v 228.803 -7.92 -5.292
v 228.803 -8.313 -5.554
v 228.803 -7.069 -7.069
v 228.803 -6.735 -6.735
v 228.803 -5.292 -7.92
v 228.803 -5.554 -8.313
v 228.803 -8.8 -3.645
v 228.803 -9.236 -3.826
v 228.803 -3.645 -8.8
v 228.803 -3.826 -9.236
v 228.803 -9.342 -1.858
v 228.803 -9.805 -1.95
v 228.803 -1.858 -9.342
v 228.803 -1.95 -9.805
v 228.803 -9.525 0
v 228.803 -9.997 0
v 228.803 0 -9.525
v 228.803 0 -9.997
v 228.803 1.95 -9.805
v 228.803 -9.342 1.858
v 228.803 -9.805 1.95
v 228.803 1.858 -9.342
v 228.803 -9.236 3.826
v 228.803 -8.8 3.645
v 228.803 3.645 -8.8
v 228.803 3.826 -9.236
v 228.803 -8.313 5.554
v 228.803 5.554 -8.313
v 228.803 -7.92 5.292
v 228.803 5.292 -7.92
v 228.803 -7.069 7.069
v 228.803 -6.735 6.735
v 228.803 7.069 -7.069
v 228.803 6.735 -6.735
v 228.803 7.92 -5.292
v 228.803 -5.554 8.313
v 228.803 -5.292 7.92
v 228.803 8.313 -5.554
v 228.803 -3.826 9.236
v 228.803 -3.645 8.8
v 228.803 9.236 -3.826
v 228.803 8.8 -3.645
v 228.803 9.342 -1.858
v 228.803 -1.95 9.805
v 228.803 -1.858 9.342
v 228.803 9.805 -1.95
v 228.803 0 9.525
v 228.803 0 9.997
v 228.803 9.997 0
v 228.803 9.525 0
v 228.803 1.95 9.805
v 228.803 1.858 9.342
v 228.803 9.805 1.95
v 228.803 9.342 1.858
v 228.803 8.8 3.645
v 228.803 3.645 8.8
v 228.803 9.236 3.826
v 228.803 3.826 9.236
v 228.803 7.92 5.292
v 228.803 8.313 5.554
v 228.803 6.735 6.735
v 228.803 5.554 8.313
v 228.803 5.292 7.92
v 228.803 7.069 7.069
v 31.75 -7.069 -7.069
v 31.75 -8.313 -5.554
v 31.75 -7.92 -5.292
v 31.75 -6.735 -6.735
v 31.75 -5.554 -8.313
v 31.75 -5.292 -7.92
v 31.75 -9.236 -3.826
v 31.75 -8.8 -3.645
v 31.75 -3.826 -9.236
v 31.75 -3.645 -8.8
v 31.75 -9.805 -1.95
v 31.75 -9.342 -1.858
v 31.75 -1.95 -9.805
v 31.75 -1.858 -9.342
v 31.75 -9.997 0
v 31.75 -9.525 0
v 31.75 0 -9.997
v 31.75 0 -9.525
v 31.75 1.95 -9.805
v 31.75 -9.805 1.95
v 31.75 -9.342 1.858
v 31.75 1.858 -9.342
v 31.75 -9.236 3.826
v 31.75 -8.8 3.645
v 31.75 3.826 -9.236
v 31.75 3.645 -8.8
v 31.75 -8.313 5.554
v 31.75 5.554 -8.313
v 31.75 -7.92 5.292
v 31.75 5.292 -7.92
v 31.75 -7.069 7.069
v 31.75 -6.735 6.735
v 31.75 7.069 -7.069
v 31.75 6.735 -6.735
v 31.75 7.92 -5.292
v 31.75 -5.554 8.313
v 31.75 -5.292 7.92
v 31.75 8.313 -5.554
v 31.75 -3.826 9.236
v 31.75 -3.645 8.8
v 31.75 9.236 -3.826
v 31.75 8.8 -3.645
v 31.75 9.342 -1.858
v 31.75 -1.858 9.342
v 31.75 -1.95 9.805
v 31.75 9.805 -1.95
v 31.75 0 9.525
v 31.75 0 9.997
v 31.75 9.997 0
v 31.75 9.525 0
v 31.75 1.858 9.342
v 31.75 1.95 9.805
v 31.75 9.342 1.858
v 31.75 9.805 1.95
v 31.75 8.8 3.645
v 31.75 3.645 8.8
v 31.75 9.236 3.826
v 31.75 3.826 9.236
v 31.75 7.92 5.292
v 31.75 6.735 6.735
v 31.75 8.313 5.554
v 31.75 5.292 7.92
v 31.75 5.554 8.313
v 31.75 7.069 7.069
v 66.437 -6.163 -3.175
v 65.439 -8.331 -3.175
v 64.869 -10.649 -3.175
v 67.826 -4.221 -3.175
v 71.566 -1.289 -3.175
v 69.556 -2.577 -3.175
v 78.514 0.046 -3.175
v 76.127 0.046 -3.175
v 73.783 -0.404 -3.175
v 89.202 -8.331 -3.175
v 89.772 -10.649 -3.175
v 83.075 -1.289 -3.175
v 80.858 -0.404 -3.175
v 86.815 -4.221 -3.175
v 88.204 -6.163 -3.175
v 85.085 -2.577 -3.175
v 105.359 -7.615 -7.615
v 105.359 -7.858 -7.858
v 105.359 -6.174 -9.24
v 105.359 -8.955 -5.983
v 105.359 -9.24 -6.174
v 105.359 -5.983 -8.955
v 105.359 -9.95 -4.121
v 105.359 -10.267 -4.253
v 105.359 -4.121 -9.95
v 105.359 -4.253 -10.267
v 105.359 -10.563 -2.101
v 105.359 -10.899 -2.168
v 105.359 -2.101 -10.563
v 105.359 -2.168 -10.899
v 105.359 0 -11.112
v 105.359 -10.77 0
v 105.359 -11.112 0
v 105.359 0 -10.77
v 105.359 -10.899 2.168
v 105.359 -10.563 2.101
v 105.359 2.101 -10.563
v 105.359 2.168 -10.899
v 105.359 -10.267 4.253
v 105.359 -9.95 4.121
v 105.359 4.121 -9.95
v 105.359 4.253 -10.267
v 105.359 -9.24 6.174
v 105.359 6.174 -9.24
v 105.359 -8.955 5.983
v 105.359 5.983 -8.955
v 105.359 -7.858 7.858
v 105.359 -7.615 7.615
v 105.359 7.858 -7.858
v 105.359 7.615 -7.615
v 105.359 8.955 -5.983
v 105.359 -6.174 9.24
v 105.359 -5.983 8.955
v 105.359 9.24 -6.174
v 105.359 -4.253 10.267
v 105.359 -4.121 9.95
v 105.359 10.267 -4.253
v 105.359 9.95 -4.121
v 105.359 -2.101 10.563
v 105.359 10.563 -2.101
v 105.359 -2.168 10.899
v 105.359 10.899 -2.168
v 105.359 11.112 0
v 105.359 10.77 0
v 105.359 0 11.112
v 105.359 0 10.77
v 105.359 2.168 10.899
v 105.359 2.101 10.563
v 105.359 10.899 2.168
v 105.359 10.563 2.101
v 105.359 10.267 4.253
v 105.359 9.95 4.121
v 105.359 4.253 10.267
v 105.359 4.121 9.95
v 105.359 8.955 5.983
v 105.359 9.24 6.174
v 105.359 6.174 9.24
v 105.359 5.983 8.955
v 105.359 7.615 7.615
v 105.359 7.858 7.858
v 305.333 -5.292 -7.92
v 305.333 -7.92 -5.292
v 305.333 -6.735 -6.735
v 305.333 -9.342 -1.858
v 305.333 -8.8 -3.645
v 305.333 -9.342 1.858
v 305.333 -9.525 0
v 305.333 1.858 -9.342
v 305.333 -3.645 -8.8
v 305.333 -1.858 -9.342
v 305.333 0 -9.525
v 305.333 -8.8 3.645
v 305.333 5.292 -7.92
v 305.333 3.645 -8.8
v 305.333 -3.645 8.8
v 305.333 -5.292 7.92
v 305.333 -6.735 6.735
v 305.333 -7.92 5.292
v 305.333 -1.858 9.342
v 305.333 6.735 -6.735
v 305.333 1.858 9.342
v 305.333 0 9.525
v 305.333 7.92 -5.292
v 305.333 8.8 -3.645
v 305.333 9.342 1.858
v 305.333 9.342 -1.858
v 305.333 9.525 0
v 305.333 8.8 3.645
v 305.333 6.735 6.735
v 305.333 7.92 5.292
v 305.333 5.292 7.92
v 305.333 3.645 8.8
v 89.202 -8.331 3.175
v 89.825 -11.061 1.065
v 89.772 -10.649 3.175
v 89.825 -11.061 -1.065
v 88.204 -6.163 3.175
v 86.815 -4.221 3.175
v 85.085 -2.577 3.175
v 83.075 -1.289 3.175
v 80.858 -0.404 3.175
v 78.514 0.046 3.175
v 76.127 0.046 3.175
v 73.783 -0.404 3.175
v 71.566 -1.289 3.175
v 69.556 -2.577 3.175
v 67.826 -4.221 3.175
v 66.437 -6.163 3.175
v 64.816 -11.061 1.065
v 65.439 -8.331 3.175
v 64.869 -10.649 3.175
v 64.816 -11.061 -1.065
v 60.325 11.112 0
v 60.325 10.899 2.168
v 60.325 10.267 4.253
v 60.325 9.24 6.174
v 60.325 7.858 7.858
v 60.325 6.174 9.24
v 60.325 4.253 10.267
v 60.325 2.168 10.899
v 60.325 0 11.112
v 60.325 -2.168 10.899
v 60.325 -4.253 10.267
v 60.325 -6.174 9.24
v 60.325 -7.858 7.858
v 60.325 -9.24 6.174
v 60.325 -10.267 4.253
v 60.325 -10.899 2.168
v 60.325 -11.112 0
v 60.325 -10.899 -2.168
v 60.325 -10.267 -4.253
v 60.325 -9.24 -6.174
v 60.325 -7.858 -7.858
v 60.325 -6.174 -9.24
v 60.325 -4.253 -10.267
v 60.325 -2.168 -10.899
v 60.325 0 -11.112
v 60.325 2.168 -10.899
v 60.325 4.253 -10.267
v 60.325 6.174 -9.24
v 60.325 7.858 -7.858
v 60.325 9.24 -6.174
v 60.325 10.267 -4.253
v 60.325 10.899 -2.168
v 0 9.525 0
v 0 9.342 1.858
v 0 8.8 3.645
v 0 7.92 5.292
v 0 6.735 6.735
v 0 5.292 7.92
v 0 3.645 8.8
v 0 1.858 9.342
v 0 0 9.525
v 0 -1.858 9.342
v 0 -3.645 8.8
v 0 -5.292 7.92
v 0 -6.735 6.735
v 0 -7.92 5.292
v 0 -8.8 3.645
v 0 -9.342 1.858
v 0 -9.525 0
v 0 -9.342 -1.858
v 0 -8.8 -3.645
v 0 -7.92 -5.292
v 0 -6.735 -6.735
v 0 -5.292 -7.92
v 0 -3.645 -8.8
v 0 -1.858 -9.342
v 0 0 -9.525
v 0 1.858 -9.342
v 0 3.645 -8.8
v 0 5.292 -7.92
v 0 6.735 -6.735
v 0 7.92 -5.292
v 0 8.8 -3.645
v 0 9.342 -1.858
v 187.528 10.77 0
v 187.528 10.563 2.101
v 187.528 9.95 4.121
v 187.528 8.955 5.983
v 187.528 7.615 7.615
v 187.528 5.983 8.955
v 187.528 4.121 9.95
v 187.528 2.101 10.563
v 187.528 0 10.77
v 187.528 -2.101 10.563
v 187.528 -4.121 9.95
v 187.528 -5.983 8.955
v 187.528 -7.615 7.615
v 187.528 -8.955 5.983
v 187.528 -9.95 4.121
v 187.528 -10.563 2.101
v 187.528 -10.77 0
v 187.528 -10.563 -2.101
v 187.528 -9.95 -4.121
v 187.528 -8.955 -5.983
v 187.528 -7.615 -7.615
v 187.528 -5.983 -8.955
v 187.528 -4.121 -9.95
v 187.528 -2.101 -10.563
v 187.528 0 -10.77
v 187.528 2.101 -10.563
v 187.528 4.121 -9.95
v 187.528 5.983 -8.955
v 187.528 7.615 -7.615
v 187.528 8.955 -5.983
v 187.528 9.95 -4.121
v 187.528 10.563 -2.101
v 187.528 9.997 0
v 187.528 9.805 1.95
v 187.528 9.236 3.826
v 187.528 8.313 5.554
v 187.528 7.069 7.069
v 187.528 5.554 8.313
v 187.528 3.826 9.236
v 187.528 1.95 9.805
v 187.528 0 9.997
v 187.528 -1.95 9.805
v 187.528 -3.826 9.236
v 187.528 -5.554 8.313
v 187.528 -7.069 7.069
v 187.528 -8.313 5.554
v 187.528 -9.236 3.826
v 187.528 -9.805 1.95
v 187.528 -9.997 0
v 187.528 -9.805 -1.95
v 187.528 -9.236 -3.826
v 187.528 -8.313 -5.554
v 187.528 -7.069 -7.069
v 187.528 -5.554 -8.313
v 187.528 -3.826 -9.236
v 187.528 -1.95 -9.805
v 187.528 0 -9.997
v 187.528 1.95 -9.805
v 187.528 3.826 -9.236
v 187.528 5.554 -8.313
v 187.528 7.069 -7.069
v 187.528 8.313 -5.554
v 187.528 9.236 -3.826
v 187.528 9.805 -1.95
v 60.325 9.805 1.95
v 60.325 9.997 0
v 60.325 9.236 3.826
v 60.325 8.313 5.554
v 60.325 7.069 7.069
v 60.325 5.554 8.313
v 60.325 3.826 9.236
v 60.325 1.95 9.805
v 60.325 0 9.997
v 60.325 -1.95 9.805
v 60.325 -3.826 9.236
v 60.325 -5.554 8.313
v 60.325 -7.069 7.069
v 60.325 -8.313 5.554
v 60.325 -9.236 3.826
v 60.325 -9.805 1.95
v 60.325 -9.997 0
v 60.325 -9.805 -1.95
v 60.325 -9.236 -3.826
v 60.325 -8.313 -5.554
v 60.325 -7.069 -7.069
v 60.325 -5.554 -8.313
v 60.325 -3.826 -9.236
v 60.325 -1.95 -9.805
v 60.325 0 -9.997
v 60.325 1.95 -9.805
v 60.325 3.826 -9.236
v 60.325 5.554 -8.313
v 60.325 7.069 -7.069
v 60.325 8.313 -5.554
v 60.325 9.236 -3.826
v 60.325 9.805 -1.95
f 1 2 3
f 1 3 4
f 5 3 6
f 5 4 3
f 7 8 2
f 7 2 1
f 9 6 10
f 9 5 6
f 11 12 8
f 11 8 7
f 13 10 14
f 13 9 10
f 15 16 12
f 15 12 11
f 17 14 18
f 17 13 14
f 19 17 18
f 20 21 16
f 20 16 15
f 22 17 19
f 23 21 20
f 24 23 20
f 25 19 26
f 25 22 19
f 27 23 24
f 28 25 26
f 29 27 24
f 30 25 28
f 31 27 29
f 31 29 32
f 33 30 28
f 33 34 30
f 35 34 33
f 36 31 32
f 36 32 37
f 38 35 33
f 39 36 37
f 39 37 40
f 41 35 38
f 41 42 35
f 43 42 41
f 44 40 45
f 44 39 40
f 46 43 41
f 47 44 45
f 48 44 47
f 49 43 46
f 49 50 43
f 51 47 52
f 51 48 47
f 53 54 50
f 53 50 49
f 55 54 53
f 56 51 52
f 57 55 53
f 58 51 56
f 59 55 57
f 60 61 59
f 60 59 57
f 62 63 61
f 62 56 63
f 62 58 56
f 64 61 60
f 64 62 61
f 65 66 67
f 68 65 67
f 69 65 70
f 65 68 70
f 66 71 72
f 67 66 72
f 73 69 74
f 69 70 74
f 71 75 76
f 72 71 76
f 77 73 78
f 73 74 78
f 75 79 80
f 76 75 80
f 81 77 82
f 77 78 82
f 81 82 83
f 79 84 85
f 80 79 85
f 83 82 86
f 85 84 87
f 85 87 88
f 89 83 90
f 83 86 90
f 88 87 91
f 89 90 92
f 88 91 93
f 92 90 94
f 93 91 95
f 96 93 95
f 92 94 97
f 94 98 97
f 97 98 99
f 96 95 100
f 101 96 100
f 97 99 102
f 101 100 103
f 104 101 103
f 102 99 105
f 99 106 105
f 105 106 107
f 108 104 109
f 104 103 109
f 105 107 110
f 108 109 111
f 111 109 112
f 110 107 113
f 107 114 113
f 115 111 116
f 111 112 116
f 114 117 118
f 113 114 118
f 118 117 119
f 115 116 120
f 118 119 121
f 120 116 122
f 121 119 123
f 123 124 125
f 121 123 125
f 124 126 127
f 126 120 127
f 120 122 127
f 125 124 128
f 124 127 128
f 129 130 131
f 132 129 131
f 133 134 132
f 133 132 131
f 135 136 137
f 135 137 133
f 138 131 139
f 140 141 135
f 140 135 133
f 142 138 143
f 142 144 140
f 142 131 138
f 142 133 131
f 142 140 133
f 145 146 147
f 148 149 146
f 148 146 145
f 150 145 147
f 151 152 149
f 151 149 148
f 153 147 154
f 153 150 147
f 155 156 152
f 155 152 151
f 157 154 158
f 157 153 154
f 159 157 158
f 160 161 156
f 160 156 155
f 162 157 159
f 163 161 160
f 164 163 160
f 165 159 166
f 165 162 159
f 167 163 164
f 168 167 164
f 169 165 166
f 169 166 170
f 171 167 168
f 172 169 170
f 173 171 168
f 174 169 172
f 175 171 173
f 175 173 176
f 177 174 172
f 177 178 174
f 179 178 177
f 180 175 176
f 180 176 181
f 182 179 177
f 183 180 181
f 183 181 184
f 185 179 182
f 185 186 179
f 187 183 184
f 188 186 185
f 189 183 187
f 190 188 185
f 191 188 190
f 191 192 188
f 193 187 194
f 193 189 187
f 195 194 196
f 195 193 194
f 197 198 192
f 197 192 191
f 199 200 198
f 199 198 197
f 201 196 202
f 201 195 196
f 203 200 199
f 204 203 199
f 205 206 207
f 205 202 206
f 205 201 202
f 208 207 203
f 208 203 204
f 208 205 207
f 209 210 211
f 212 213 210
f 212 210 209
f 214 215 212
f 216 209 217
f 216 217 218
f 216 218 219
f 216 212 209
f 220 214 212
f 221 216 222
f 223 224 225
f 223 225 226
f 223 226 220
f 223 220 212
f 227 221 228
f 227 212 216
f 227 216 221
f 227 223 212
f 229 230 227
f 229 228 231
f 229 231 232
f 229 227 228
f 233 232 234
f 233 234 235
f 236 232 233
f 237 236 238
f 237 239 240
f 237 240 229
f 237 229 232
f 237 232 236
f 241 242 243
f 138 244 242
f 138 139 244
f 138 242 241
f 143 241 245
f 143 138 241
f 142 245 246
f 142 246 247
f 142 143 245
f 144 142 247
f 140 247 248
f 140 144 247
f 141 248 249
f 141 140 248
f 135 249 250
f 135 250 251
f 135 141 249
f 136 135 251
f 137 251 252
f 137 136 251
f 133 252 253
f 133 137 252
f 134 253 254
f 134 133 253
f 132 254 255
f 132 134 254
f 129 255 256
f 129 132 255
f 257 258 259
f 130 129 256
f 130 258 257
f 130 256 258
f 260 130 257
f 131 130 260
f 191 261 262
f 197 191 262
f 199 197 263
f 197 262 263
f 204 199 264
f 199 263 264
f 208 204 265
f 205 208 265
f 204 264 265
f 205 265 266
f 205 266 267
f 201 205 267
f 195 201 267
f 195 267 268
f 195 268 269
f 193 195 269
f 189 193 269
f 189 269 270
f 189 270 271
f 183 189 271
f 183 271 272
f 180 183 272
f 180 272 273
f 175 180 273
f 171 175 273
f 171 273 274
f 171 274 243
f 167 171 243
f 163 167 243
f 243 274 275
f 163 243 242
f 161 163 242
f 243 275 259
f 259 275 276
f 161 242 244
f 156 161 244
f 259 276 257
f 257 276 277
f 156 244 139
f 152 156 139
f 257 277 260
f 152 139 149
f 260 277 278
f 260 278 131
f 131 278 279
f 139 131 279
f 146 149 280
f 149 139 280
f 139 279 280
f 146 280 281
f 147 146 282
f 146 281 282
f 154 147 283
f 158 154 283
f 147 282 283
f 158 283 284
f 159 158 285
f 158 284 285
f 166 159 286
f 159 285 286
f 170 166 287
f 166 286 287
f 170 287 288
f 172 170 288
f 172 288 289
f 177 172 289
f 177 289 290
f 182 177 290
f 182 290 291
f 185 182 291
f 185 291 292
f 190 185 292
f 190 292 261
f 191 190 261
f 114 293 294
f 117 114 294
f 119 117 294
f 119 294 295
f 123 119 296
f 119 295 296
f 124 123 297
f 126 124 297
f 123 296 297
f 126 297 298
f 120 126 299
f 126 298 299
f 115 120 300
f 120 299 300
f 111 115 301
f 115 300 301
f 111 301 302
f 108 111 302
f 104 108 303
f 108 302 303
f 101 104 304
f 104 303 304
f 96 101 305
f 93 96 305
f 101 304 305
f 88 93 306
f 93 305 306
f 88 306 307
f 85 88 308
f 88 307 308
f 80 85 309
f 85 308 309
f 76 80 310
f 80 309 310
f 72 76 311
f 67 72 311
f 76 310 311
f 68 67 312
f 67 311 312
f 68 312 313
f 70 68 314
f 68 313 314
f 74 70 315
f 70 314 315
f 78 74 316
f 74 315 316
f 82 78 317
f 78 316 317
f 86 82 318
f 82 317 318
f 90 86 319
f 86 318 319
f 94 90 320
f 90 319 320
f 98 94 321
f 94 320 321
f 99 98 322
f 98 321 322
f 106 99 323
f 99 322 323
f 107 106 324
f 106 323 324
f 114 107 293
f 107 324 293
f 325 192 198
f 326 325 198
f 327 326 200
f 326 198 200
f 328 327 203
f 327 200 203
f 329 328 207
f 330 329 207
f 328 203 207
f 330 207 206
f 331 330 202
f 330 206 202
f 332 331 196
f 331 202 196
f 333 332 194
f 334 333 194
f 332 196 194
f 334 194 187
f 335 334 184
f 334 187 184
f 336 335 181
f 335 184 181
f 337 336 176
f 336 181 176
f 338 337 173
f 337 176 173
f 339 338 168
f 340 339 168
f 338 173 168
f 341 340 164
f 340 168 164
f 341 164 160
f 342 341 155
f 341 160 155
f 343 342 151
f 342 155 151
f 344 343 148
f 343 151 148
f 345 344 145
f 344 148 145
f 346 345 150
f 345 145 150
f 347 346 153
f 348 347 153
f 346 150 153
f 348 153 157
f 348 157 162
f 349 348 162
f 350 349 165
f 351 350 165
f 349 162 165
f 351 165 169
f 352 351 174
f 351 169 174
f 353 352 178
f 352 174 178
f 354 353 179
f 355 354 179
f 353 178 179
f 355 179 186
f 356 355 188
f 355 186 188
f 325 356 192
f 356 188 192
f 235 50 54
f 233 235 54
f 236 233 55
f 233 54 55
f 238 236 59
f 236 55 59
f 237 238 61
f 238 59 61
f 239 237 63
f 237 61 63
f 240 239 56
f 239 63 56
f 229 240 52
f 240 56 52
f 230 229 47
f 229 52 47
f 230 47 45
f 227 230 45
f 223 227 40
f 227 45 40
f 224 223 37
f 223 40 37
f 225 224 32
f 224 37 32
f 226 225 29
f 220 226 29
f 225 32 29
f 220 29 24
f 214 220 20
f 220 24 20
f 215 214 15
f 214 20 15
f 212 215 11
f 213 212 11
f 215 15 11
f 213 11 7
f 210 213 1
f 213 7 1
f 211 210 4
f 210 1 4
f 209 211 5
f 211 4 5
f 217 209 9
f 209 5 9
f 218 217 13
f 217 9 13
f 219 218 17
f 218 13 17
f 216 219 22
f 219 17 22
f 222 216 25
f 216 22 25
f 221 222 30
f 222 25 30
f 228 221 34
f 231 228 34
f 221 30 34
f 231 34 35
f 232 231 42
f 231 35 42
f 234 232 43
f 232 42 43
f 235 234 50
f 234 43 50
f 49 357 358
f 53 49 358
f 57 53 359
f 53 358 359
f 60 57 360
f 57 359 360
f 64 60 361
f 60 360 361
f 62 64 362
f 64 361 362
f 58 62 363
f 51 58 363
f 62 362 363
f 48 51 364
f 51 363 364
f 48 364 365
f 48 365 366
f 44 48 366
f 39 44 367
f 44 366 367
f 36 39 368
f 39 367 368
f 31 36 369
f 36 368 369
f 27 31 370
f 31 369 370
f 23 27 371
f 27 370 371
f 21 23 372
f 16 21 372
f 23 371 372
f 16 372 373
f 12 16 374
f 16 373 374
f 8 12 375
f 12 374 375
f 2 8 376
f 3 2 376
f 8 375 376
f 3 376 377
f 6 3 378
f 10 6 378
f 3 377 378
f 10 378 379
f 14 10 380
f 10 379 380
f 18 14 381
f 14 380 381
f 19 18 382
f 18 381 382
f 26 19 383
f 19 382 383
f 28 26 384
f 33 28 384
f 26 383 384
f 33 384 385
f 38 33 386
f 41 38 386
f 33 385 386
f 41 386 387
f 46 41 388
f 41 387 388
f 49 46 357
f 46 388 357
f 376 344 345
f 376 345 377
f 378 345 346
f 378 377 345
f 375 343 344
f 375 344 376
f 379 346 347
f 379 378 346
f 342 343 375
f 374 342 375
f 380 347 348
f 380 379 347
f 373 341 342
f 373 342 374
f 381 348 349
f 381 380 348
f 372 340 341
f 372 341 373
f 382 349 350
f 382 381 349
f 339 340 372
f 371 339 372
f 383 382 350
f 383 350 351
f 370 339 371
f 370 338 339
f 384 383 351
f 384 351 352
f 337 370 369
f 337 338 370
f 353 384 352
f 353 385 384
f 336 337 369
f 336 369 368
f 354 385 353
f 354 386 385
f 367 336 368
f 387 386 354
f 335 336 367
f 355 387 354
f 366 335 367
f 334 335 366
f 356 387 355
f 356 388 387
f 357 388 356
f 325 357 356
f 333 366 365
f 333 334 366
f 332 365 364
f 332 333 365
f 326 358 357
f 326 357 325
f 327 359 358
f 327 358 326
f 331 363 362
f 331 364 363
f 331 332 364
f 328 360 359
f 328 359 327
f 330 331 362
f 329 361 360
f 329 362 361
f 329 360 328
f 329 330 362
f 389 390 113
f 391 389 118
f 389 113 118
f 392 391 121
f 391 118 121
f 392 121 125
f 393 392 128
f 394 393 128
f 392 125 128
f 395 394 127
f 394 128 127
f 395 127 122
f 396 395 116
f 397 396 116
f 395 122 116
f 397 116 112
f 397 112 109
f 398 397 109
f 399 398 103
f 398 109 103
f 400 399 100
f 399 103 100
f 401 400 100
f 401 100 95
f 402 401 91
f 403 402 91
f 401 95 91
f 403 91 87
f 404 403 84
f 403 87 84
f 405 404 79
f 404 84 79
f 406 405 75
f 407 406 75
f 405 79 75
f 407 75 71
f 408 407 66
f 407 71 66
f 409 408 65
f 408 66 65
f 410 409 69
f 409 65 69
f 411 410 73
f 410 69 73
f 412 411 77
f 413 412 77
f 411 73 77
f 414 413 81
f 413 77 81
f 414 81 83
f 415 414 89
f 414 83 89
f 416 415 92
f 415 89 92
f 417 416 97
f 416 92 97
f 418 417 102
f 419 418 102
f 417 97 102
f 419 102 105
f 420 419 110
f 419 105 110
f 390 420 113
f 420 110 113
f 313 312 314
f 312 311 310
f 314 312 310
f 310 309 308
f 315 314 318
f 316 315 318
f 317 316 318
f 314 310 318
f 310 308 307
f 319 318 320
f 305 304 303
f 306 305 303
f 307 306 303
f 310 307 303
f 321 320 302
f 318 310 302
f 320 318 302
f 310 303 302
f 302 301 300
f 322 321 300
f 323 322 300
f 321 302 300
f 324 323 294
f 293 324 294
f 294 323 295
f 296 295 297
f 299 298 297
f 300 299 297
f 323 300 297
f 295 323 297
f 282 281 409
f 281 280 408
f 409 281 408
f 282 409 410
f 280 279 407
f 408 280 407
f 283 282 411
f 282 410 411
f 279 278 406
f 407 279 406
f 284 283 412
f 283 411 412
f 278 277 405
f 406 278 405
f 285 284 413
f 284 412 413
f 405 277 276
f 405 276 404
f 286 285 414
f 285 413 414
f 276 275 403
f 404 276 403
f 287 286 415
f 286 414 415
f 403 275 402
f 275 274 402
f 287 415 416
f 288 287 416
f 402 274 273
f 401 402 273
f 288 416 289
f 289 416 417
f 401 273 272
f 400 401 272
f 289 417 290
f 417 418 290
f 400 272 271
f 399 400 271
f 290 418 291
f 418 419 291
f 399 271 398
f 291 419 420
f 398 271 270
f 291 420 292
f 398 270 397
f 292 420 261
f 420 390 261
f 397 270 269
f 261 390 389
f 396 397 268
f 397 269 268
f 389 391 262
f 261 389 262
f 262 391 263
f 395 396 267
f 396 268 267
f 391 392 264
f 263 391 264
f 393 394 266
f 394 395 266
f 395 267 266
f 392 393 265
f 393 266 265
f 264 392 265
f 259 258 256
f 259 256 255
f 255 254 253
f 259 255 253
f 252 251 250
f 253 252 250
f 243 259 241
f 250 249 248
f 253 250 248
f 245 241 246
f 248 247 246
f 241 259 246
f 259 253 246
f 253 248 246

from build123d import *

# Parameters (mm, degrees)
F0_R      = 9.525
F1_DEPTH  = 31.75
F2_R      = 9.99744
F3_DEPTH  = 28.575
F4_R      = 11.1125
F5_DEPTH  = 45.0342
F6_R      = 10.7696
F7_DEPTH  = 82.169
F8_R      = 9.99744
F9_DEPTH  = 41.275
F10_R     = 9.525
F11_DEPTH = 76.5302
F12_R     = 12.5854341712
F13_DEPTH = 3.175
F14_DEPTH = 3.175


with BuildPart() as f1:
    # F0 (on Right) → F1 (new body)
    with BuildSketch(Plane.YZ):
        Circle(F0_R)
    extrude(amount=F1_DEPTH)

    # F2 (on face) → F3 (join)
    with BuildSketch(Plane.YZ.offset(31.75)):
        Circle(F2_R)
    extrude(amount=F3_DEPTH)

    # F4 (on face) → F5 (join)
    with BuildSketch(Plane.YZ.offset(60.325)):
        Circle(F4_R)
    extrude(amount=F5_DEPTH)

    # F6 (on face) → F7 (join)
    with BuildSketch(Plane.YZ.offset(105.3592)):
        Circle(F6_R)
    extrude(amount=F7_DEPTH)

    # F8 (on face) → F9 (join)
    with BuildSketch(Plane.YZ.offset(187.5282)):
        Circle(F8_R)
    extrude(amount=F9_DEPTH)

    # F10 (on face) → F11 (join)
    with BuildSketch(Plane.YZ.offset(228.8032)):
        Circle(F10_R)
    extrude(amount=F11_DEPTH)

    # F12 (on Top) → F13 (cut)
    with BuildSketch(Plane.XY):
        with Locations((77.320471406, -12.4823525548)):
            Circle(F12_R)
    extrude(amount=F13_DEPTH, mode=Mode.SUBTRACT)

    # F14 (cut): a face of the model
    f14_faces = [f1.faces().sort_by_distance(p)[0] for p in [
        (77.320471406, -6.3933996549, 0),
    ]]
    extrude(f14_faces, amount=-F14_DEPTH, mode=Mode.SUBTRACT)


solid = f1.part
